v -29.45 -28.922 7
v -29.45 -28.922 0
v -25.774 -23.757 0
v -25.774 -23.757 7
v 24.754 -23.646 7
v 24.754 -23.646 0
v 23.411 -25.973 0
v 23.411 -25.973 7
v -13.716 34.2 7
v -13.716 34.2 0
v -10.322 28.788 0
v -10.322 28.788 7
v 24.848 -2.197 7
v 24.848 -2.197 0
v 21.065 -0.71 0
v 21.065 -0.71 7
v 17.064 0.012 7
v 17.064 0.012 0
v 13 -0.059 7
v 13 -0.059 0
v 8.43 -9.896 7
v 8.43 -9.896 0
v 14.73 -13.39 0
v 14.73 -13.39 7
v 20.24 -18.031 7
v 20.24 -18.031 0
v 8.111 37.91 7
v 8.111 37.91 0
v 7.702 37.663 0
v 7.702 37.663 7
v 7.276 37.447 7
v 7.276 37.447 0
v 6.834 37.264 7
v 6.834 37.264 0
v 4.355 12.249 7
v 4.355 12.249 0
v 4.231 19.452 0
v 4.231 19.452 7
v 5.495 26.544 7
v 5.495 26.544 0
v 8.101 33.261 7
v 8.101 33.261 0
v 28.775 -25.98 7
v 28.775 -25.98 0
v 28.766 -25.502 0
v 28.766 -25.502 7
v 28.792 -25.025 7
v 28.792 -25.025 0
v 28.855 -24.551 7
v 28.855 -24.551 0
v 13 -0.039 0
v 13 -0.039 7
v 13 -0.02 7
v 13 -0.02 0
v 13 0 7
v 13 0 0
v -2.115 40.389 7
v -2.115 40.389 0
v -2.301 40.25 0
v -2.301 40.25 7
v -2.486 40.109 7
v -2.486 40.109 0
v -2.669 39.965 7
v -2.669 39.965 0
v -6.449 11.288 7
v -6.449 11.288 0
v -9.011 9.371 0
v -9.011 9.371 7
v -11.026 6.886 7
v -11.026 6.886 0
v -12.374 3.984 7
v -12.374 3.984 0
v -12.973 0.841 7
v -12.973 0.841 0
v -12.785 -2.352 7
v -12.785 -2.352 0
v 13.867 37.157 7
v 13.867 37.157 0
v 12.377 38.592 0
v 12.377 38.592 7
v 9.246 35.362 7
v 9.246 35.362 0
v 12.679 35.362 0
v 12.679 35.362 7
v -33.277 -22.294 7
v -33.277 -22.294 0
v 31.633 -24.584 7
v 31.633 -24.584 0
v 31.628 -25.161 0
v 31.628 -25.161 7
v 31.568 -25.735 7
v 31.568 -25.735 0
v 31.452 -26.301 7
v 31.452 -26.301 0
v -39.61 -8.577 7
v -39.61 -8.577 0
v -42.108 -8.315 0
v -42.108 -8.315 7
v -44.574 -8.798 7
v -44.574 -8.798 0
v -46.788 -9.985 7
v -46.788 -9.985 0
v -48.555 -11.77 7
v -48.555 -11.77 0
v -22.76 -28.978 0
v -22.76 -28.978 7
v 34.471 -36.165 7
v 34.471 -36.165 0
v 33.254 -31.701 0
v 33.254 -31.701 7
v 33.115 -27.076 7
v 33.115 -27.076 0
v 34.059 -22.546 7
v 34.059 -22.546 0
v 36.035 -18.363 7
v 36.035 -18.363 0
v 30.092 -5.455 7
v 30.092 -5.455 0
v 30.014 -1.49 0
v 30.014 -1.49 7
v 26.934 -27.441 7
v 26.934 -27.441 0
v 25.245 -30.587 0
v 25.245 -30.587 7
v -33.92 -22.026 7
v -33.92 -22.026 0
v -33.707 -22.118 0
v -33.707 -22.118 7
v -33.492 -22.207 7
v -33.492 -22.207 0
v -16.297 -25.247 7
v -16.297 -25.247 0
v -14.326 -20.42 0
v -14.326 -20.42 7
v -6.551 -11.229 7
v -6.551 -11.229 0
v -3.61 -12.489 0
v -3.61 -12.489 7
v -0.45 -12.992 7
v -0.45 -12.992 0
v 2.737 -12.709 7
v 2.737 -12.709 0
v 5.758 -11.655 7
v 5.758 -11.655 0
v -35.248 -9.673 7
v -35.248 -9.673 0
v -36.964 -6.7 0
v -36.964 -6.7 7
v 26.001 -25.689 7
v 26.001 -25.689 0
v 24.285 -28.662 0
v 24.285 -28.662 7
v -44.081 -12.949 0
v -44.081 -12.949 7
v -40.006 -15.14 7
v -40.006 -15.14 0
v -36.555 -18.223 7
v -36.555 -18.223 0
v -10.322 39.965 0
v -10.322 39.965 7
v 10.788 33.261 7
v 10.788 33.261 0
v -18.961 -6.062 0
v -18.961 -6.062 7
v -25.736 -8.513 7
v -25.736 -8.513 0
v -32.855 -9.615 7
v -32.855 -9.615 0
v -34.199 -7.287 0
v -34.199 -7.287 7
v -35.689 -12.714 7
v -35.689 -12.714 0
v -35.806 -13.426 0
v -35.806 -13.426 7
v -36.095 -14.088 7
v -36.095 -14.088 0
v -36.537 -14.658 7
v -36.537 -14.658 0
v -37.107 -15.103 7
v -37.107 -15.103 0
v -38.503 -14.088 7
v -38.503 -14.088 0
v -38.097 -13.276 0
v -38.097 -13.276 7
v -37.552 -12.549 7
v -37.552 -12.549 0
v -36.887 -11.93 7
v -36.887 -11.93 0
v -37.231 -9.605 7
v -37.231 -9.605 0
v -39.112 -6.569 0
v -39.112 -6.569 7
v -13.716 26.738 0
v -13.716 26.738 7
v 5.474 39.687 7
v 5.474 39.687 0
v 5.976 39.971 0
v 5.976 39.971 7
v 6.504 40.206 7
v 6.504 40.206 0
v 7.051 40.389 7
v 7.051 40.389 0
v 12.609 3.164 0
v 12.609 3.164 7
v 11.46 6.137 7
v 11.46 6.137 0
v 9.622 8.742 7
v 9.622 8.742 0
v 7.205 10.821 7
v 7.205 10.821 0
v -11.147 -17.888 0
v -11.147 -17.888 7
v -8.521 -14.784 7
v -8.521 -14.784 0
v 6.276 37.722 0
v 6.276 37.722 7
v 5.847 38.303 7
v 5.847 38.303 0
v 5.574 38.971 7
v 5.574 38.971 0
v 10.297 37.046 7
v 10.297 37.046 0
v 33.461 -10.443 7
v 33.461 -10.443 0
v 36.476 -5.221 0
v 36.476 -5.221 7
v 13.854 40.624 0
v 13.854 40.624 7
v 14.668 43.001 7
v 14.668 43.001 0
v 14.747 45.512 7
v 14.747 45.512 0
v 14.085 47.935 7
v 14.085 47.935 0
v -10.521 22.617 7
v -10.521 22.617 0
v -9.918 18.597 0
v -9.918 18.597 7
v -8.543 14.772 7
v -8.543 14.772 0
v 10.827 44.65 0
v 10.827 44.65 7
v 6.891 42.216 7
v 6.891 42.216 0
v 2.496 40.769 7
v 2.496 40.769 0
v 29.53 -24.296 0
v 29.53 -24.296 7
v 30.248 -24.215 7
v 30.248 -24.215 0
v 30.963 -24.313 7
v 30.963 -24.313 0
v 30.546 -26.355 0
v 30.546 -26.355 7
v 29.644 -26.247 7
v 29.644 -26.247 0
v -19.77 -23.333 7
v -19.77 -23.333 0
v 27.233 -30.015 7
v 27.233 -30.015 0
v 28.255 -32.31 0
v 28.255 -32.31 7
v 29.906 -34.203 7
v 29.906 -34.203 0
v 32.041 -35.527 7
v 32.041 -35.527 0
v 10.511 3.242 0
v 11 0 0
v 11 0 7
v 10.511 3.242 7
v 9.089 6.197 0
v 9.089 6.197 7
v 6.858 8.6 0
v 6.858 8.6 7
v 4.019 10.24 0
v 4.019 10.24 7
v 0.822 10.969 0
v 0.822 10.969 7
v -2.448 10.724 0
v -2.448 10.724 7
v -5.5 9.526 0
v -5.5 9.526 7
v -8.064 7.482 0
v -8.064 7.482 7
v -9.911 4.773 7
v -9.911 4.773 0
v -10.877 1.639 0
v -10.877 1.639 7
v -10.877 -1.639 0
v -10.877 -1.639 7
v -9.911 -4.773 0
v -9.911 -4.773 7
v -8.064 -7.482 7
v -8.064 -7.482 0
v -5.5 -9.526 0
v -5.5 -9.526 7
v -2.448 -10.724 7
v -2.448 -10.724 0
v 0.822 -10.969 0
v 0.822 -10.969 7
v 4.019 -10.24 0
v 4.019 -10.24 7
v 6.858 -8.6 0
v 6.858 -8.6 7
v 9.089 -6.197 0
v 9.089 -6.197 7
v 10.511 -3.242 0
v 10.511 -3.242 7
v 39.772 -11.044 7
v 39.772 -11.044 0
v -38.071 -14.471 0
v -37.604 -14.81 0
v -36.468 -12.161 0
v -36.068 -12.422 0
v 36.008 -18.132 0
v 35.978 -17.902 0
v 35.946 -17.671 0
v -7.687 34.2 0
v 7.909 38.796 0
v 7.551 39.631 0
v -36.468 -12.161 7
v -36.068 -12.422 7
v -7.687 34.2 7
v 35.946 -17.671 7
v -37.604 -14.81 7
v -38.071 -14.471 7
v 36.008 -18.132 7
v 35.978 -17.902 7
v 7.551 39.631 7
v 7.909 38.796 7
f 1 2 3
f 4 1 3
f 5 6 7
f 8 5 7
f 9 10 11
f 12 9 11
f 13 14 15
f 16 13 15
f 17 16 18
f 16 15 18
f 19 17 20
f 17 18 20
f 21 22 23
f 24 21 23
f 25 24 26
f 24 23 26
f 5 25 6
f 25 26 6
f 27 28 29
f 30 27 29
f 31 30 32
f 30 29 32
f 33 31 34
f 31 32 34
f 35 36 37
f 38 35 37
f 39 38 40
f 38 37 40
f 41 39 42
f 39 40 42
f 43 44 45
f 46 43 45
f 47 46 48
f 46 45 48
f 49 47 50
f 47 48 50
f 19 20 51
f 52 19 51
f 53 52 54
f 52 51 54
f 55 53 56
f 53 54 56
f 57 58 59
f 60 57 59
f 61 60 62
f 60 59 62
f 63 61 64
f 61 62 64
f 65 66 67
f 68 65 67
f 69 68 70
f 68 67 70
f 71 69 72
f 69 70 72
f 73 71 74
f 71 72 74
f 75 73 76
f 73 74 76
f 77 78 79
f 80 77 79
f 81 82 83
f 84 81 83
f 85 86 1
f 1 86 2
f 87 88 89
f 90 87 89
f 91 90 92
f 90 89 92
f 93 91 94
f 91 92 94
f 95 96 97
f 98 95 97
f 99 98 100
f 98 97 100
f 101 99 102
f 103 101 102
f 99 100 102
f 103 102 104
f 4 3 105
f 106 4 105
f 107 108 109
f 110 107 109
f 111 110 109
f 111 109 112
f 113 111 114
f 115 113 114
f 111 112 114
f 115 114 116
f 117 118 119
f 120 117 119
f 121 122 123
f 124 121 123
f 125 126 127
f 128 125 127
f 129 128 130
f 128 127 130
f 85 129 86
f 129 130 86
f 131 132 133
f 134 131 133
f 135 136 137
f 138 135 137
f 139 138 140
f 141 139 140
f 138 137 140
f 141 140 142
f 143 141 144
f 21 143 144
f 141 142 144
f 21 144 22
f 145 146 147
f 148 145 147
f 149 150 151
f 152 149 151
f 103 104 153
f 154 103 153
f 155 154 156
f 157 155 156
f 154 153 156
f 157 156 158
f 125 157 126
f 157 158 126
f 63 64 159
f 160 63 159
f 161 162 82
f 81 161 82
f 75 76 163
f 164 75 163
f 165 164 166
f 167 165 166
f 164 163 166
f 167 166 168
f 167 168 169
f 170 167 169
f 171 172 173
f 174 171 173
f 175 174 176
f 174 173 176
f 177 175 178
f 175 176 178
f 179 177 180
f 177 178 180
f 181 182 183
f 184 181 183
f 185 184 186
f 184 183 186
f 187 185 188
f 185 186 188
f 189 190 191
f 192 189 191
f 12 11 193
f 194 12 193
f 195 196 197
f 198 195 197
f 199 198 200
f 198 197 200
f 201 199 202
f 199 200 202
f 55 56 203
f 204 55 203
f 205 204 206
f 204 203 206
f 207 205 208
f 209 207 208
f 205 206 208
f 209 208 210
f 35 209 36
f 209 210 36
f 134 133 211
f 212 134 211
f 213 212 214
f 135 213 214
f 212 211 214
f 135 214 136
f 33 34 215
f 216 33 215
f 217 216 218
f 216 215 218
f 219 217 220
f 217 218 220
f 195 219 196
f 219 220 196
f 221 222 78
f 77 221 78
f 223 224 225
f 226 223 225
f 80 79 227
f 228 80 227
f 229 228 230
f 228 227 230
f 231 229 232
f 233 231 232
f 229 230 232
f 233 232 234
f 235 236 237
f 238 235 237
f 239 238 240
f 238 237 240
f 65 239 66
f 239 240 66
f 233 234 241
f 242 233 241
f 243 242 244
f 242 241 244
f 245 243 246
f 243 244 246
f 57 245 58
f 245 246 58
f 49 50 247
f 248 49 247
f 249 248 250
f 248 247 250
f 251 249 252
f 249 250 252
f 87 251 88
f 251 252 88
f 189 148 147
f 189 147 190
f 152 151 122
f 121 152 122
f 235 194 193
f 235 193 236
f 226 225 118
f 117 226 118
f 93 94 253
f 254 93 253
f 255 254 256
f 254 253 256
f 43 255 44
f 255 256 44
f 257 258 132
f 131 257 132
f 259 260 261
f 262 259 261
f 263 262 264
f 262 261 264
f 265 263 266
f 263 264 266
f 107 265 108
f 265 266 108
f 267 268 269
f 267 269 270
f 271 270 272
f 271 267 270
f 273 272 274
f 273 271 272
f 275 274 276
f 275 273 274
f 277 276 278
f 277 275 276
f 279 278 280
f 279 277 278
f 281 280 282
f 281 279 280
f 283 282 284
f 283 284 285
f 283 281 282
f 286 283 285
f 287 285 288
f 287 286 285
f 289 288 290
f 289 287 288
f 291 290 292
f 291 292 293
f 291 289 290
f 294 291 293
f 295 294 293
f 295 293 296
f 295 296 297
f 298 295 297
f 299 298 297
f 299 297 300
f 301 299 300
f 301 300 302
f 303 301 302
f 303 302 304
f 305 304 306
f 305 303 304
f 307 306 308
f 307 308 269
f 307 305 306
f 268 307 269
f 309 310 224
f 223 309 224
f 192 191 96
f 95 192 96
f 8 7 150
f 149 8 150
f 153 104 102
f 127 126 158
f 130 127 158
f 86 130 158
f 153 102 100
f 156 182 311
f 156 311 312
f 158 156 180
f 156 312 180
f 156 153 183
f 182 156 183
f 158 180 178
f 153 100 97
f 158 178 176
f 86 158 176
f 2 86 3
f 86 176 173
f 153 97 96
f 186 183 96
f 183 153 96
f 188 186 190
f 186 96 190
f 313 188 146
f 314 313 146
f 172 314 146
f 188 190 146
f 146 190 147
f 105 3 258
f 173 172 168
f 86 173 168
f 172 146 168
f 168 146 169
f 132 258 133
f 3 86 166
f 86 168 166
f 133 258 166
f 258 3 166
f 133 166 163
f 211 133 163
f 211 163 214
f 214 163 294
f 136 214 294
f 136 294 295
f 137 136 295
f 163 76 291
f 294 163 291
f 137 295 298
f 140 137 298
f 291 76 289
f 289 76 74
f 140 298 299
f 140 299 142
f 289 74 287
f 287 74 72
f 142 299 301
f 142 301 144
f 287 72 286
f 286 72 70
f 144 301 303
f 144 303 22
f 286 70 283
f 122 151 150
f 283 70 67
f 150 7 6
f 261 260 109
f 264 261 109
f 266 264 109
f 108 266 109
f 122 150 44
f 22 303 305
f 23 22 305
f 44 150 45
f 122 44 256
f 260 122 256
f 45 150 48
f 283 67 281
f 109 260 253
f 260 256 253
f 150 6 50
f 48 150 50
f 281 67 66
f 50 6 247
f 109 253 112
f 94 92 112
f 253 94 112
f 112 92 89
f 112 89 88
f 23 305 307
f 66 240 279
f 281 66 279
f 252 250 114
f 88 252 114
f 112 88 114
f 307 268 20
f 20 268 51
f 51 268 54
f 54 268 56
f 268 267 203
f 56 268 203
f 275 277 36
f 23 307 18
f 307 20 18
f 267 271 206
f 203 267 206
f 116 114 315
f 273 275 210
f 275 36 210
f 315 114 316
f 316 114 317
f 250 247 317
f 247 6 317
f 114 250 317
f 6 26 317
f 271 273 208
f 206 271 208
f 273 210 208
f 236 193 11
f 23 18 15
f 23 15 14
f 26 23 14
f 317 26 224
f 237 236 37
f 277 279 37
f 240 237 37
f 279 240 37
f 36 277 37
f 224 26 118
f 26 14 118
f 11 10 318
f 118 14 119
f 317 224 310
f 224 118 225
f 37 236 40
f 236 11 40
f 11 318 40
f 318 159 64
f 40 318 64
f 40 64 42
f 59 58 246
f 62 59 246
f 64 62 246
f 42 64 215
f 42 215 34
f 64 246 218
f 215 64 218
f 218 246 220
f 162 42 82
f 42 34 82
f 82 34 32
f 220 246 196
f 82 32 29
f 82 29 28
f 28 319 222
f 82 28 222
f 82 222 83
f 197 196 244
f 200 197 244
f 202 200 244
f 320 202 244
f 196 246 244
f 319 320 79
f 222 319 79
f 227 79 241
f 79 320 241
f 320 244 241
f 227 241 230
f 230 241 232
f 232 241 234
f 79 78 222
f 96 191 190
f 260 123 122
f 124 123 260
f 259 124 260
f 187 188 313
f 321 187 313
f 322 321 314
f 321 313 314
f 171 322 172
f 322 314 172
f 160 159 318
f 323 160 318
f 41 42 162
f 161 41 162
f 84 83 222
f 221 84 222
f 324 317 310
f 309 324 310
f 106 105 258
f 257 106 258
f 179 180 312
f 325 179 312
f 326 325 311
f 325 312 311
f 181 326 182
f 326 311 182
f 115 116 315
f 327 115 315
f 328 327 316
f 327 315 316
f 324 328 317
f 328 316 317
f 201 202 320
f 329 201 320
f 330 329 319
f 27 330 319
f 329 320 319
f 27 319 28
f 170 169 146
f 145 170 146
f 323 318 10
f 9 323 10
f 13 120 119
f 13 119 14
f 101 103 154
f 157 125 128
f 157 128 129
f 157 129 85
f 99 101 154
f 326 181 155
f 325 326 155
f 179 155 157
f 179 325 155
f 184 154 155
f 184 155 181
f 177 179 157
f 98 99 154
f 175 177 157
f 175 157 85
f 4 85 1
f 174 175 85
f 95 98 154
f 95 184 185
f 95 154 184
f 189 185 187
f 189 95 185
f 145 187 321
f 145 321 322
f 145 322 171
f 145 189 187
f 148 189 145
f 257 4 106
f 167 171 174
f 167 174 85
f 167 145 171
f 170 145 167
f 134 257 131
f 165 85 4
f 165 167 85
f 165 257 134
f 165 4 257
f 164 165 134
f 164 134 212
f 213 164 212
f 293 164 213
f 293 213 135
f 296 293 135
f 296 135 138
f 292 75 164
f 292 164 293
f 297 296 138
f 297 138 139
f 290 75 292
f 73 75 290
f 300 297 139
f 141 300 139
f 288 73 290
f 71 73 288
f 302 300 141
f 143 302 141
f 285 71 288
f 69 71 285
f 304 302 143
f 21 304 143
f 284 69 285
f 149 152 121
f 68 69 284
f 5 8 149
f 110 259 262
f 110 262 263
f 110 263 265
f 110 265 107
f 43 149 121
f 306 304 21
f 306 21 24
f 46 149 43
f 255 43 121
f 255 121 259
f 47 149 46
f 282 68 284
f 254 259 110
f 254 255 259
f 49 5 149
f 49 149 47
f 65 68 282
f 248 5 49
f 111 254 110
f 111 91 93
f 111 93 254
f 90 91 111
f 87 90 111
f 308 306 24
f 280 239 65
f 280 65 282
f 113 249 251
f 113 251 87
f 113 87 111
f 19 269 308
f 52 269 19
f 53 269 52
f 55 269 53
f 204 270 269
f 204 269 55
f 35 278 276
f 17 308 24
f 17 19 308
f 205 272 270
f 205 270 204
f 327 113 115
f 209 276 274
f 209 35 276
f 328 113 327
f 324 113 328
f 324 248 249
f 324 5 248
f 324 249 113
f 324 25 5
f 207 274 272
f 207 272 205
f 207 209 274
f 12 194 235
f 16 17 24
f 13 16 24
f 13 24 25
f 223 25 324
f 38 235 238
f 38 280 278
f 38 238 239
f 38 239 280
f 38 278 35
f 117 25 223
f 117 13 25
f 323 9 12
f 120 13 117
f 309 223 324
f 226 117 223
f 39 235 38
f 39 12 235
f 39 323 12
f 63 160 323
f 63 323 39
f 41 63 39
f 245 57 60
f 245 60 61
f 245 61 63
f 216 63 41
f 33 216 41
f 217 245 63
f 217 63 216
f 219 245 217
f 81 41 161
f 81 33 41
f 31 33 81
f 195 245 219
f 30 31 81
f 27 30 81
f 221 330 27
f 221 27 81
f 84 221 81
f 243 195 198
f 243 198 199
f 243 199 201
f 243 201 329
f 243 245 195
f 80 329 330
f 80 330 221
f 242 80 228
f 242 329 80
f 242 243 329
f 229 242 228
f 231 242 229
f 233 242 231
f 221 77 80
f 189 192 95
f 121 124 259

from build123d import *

# Parameters (mm, degrees)
F0_R     = 11
F1_DEPTH = 7


with BuildPart() as f1:
    # F0 (on Top) → F1 (new body)
    with BuildSketch(Plane.XY):
        with BuildLine():
            ThreePointArc((12.9998675053, -0.0586928035), (12.9999668763, -0.0293464765), (13, 0))
            ThreePointArc((13, 0), (10.6212058702, 7.4959979898), (4.3553867904, 12.2486981311))
            ThreePointArc((4.3553867904, 12.2486981311), (-1.1518936393, 12.9488663999), (-6.4491042938, 11.2875619072))
            ThreePointArc((-6.4491042938, 11.2875619072), (-11.7899940722, 5.4768640459), (-12.78537714, -2.3524734618))
            ThreePointArc((-12.78537714, -2.3524734618), (-10.6381004329, -7.4720023541), (-6.5507632115, -11.2288691036))
            ThreePointArc((-6.5507632115, -11.2288691036), (1.1518936393, -12.9488663999), (8.4299903496, -9.8962246693))
            ThreePointArc((8.4299903496, -9.8962246693), (11.7899940722, -5.4768640459), (12.9998675053, -0.0586928035))
        make_face()
        Circle(F0_R, mode=Mode.SUBTRACT)
        with BuildLine():
            ThreePointArc((-6.4491042938, 11.2875619072), (-1.1518936393, 12.9488663999), (4.3553867904, 12.2486981311))
            ThreePointArc((4.3553867904, 12.2486981311), (4.6911379091, 23.0286932253), (8.100961018, 33.2607081496))
            ThreePointArc((8.100961018, 33.2607081496), (8.6567992586, 34.3205730834), (9.2463958264, 35.36203634))
            ThreePointArc((9.2463958264, 35.36203634), (9.7605514778, 36.2110441588), (10.2971438318, 37.0460525155))
            ThreePointArc((10.2971438318, 37.0460525155), (11.39658988, 37.7388536244), (12.3768031473, 38.5920458302))
            ThreePointArc((12.3768031473, 38.5920458302), (14.6675808716, 43.0008688553), (14.0846017748, 47.9349866509))
            ThreePointArc((14.0846017748, 47.9349866509), (6.8911464414, 42.2160675911), (-2.1151392079, 40.388869285))
            ThreePointArc((-2.1151392079, 40.388869285), (-2.393767425, 40.1794812412), (-2.668843506, 39.965448099))
            ThreePointArc((-2.668843506, 39.965448099), (-5.4452369878, 37.3153043367), (-7.6866932218, 34.1996187496))
            ThreePointArc((-7.6866932218, 34.1996187496), (-9.9529658293, 28.6161487308), (-10.5214164041, 22.6171494036))
            ThreePointArc((-10.5214164041, 22.6171494036), (-9.323996956, 16.6508797858), (-6.4491042938, 11.2875619072))
        make_face()
        with BuildLine():
            ThreePointArc((7.051001075, 40.388869285), (8.6740724534, 40.6129338137), (10.2971438318, 40.388869285))
            ThreePointArc((10.2971438318, 40.388869285), (9.3700559238, 39.0032433011), (8.1113596557, 37.9100209718))
            ThreePointArc((8.1113596557, 37.9100209718), (7.4912144869, 37.5507062183), (6.8342023203, 37.2643111495))
            ThreePointArc((6.8342023203, 37.2643111495), (5.0310997778, 36.8856908115), (3.1956662424, 37.0460525155))
            ThreePointArc((3.1956662424, 37.0460525155), (4.1384254151, 38.5358013845), (5.4740093923, 39.6866106607))
            ThreePointArc((5.4740093923, 39.6866106607), (6.2370767108, 40.0948422534), (7.051001075, 40.388869285))
        make_face(mode=Mode.SUBTRACT)
        with BuildLine():
            ThreePointArc((24.8477341467, -2.196760812), (19.0820833679, -0.2506216642), (12.9998675053, -0.0586928035))
            ThreePointArc((12.9998675053, -0.0586928035), (11.7899940722, -5.4768640459), (8.4299903496, -9.8962246693))
            ThreePointArc((8.4299903496, -9.8962246693), (17.5978643945, -15.5769912146), (24.7541376964, -23.6459921114))
            ThreePointArc((24.7541376964, -23.6459921114), (25.3940885333, -24.6572946151), (26.0012238868, -25.6886318491))
            ThreePointArc((26.0012238868, -25.6886318491), (26.4794084001, -26.5584076141), (26.9342506724, -27.4406144026))
            ThreePointArc((26.9342506724, -27.4406144026), (26.9845110085, -28.7391631648), (27.2332904993, -30.0146488583))
            ThreePointArc((27.2332904993, -30.0146488583), (29.9060543777, -34.2029320745), (34.4706152824, -36.1651162646))
            ThreePointArc((34.4706152824, -36.1651162646), (33.1146137611, -27.075941675), (36.0353564349, -18.3626703559))
            ThreePointArc((36.0353564349, -18.3626703559), (35.9933351783, -18.0166772198), (35.9455150804, -17.6714377746))
            ThreePointArc((35.9455150804, -17.6714377746), (35.0386199994, -13.9419386073), (33.4610852478, -10.4429377737))
            ThreePointArc((33.4610852478, -10.4429377737), (29.758794674, -5.6885531142), (24.8477341467, -2.196760812))
        make_face()
        with BuildLine():
            ThreePointArc((28.8547389499, -24.5507483987), (29.42839539, -22.7999056223), (30.4849894672, -21.2905544057))
            ThreePointArc((30.4849894672, -21.2905544057), (31.3037702466, -22.8518822334), (31.6326083261, -24.5839365246))
            ThreePointArc((31.6326083261, -24.5839365246), (31.6046135967, -25.4488880036), (31.4522862935, -26.3007806955))
            ThreePointArc((31.4522862935, -26.3007806955), (30.8347961782, -27.8184340058), (29.829214915, -29.1120227873))
            ThreePointArc((29.829214915, -29.1120227873), (29.0927715668, -27.6163281154), (28.7753613917, -25.979654007))
            ThreePointArc((28.7753613917, -25.979654007), (28.7742582717, -25.26293516), (28.8547389499, -24.5507483987))
        make_face(mode=Mode.SUBTRACT)
        with BuildLine():
            ThreePointArc((-6.5507632115, -11.2288691036), (-10.6381004329, -7.4720023541), (-12.78537714, -2.3524734618))
            ThreePointArc((-12.78537714, -2.3524734618), (-22.2890023036, -7.4517020107), (-32.8550987144, -9.6147160382))
            ThreePointArc((-32.8550987144, -9.6147160382), (-34.0508877919, -9.6632784683), (-35.2476197132, -9.6734044909))
            ThreePointArc((-35.2476197132, -9.6734044909), (-36.2399598779, -9.6526365446), (-37.2313945043, -9.6054381129))
            ThreePointArc((-37.2313945043, -9.6054381129), (-38.3811008885, -8.9996904596), (-39.6100936466, -8.5773969719))
            ThreePointArc((-39.6100936466, -8.5773969719), (-44.5736352493, -8.7979367808), (-48.5552170572, -11.7698703863))
            ThreePointArc((-48.5552170572, -11.7698703863), (-40.0057602025, -15.1401259161), (-33.920217227, -22.0261989291))
            ThreePointArc((-33.920217227, -22.0261989291), (-33.5995677532, -22.1628040214), (-33.2766715744, -22.2940103244))
            ThreePointArc((-33.2766715744, -22.2940103244), (-29.5933830117, -23.3733657294), (-25.774392026, -23.756680976))
            ThreePointArc((-25.774392026, -23.756680976), (-19.8058288446, -22.9275956166), (-14.3263177426, -20.4203885915))
            ThreePointArc((-14.3263177426, -20.4203885915), (-9.7580864119, -16.4002581216), (-6.5507632115, -11.2288691036))
        make_face()
        with BuildLine():
            ThreePointArc((-35.6889412702, -12.7135627508), (-34.4594951678, -14.0857851892), (-33.6806557096, -15.7554981098))
            ThreePointArc((-33.6806557096, -15.7554981098), (-35.4421956617, -15.6839191511), (-37.1066177184, -15.1026741361))
            ThreePointArc((-37.1066177184, -15.1026741361), (-37.8416903076, -14.6459542498), (-38.5032873684, -14.0880885895))
            ThreePointArc((-38.5032873684, -14.0880885895), (-39.5088686316, -12.7944998079), (-40.1263587469, -11.2768464977))
            ThreePointArc((-40.1263587469, -11.2768464977), (-38.4628274906, -11.3869151857), (-36.8867210474, -11.9303669648))
            ThreePointArc((-36.8867210474, -11.9303669648), (-36.2654727586, -12.2877710583), (-35.6889412702, -12.7135627508))
        make_face(mode=Mode.SUBTRACT)
        with BuildLine():
            Line((-13.7161424013, 26.7376997309), (-10.5214164041, 22.6171494036))
            ThreePointArc((-10.5214164041, 22.6171494036), (-9.9529658293, 28.6161487308), (-7.6866932218, 34.1996187496))
            Line((-7.6866932218, 34.1996187496), (-13.7161424013, 34.1996187496))
            Line((-13.7161424013, 34.1996187496), (-10.3218945159, 28.7882397874))
            Line((-10.3218945159, 28.7882397874), (-13.7161424013, 26.7376997309))
        make_face()
        with BuildLine():
            Line((30.0135984064, -1.490322104), (24.8477341467, -2.196760812))
            ThreePointArc((24.8477341467, -2.196760812), (29.758794674, -5.6885531142), (33.4610852478, -10.4429377737))
            Line((33.4610852478, -10.4429377737), (36.4758098376, -5.2212816134))
            Line((36.4758098376, -5.2212816134), (30.0922942441, -5.4550970278))
            Line((30.0922942441, -5.4550970278), (30.0135984064, -1.490322104))
        make_face()
        with BuildLine():
            Line((-16.2974560051, -25.2473776269), (-14.3263177426, -20.4203885915))
            ThreePointArc((-14.3263177426, -20.4203885915), (-19.8058288446, -22.9275956166), (-25.774392026, -23.756680976))
            Line((-25.774392026, -23.756680976), (-22.7596674363, -28.9783371363))
            Line((-22.7596674363, -28.9783371363), (-19.7703997282, -23.3331427596))
            Line((-19.7703997282, -23.3331427596), (-16.2974560051, -25.2473776269))
        make_face()
        with BuildLine():
            Line((-10.3218945159, 39.965448099), (-7.6866932218, 34.1996187496))
            ThreePointArc((-7.6866932218, 34.1996187496), (-5.4452369878, 37.3153043367), (-2.668843506, 39.965448099))
            Line((-2.668843506, 39.965448099), (-10.3218945159, 39.965448099))
        make_face()
        with BuildLine():
            Line((39.7720405853, -11.0437011836), (33.4610852478, -10.4429377737))
            ThreePointArc((33.4610852478, -10.4429377737), (35.0386199994, -13.9419386073), (35.9455150804, -17.6714377746))
            Line((35.9455150804, -17.6714377746), (39.7720405853, -11.0437011836))
        make_face()
        with BuildLine():
            Line((-29.4501460694, -28.9217469154), (-25.774392026, -23.756680976))
            ThreePointArc((-25.774392026, -23.756680976), (-29.5933830117, -23.3733657294), (-33.2766715744, -22.2940103244))
            Line((-33.2766715744, -22.2940103244), (-29.4501460694, -28.9217469154))
        make_face()
        with BuildLine():
            ThreePointArc((31.6326083261, -24.5839365246), (31.3037702466, -22.8518822334), (30.4849894672, -21.2905544057))
            ThreePointArc((30.4849894672, -21.2905544057), (29.42839539, -22.7999056223), (28.8547389499, -24.5507483987))
            ThreePointArc((28.8547389499, -24.5507483987), (30.2478836802, -24.2149589832), (31.6326083261, -24.5839365246))
        make_face()
        with BuildLine():
            ThreePointArc((6.8342023203, 37.2643111495), (5.846827791, 38.3029151694), (5.4740093923, 39.6866106607))
            ThreePointArc((5.4740093923, 39.6866106607), (4.1384254151, 38.5358013845), (3.1956662424, 37.0460525155))
            ThreePointArc((3.1956662424, 37.0460525155), (5.0310997778, 36.8856908115), (6.8342023203, 37.2643111495))
        make_face()
        with BuildLine():
            ThreePointArc((-37.1066177184, -15.1026741361), (-35.4421956617, -15.6839191511), (-33.6806557096, -15.7554981098))
            ThreePointArc((-33.6806557096, -15.7554981098), (-34.4594951678, -14.0857851892), (-35.6889412702, -12.7135627508))
            ThreePointArc((-35.6889412702, -12.7135627508), (-36.0947114712, -14.0879561862), (-37.1066177184, -15.1026741361))
        make_face()
        with BuildLine():
            ThreePointArc((31.4522862935, -26.3007806955), (30.0921060745, -26.3212575331), (28.7753613917, -25.979654007))
            ThreePointArc((28.7753613917, -25.979654007), (29.0927715668, -27.6163281154), (29.829214915, -29.1120227873))
            ThreePointArc((29.829214915, -29.1120227873), (30.8347961782, -27.8184340058), (31.4522862935, -26.3007806955))
        make_face()
        with BuildLine():
            ThreePointArc((8.1113596557, 37.9100209718), (9.3700559238, 39.0032433011), (10.2971438318, 40.388869285))
            ThreePointArc((10.2971438318, 40.388869285), (8.6740724534, 40.6129338137), (7.051001075, 40.388869285))
            ThreePointArc((7.051001075, 40.388869285), (7.7488246459, 39.2211570805), (8.1113596557, 37.9100209718))
        make_face()
        with BuildLine():
            ThreePointArc((-38.5032873684, -14.0880885895), (-37.8409307205, -12.8998995474), (-36.8867210474, -11.9303669648))
            ThreePointArc((-36.8867210474, -11.9303669648), (-38.4628274906, -11.3869151857), (-40.1263587469, -11.2768464977))
            ThreePointArc((-40.1263587469, -11.2768464977), (-39.5088686316, -12.7944998079), (-38.5032873684, -14.0880885895))
        make_face()
        with BuildLine():
            ThreePointArc((10.2971438318, 37.0460525155), (9.7605514778, 36.2110441588), (9.2463958264, 35.36203634))
            Line((9.2463958264, 35.36203634), (12.6792366009, 35.36203634))
            Line((12.6792366009, 35.36203634), (10.2971438318, 37.0460525155))
        make_face()
        with BuildLine():
            ThreePointArc((26.9342506724, -27.4406144026), (26.4794084001, -26.5584076141), (26.0012238868, -25.6886318491))
            Line((26.0012238868, -25.6886318491), (24.2848034995, -28.661559167))
            Line((24.2848034995, -28.661559167), (26.9342506724, -27.4406144026))
        make_face()
        with BuildLine():
            ThreePointArc((-37.2313945043, -9.6054381129), (-36.2399598779, -9.6526365446), (-35.2476197132, -9.6734044909))
            Line((-35.2476197132, -9.6734044909), (-36.9640401004, -6.700477173))
            Line((-36.9640401004, -6.700477173), (-37.2313945043, -9.6054381129))
        make_face()
        with BuildLine():
            ThreePointArc((9.2463958264, 35.36203634), (8.6567992586, 34.3205730834), (8.100961018, 33.2607081496))
            Line((8.100961018, 33.2607081496), (10.7882244635, 33.2607081496))
            Line((10.7882244635, 33.2607081496), (9.2463958264, 35.36203634))
        make_face()
        with BuildLine():
            ThreePointArc((26.0012238868, -25.6886318491), (25.3940885333, -24.6572946151), (24.7541376964, -23.6459921114))
            Line((24.7541376964, -23.6459921114), (23.4105059737, -25.9732305219))
            Line((23.4105059737, -25.9732305219), (26.0012238868, -25.6886318491))
        make_face()
        with BuildLine():
            ThreePointArc((-35.2476197132, -9.6734044909), (-34.0508877919, -9.6632784683), (-32.8550987144, -9.6147160382))
            Line((-32.8550987144, -9.6147160382), (-34.1987304372, -7.2874776277))
            Line((-34.1987304372, -7.2874776277), (-35.2476197132, -9.6734044909))
        make_face()
        with BuildLine():
            ThreePointArc((12.3768031473, 38.5920458302), (11.39658988, 37.7388536244), (10.2971438318, 37.0460525155))
            Line((10.2971438318, 37.0460525155), (13.8669739614, 37.1565501872))
            Line((13.8669739614, 37.1565501872), (12.3768031473, 38.5920458302))
        make_face()
        with BuildLine():
            ThreePointArc((27.2332904993, -30.0146488583), (26.9845110085, -28.7391631648), (26.9342506724, -27.4406144026))
            Line((26.9342506724, -27.4406144026), (25.2450293984, -30.5874268178))
            Line((25.2450293984, -30.5874268178), (27.2332904993, -30.0146488583))
        make_face()
        with BuildLine():
            ThreePointArc((-39.6100936466, -8.5773969719), (-38.3811008885, -8.9996904596), (-37.2313945043, -9.6054381129))
            Line((-37.2313945043, -9.6054381129), (-39.1120033598, -6.5691233694))
            Line((-39.1120033598, -6.5691233694), (-39.6100936466, -8.5773969719))
        make_face()
    extrude(amount=F1_DEPTH)


solid = f1.part
